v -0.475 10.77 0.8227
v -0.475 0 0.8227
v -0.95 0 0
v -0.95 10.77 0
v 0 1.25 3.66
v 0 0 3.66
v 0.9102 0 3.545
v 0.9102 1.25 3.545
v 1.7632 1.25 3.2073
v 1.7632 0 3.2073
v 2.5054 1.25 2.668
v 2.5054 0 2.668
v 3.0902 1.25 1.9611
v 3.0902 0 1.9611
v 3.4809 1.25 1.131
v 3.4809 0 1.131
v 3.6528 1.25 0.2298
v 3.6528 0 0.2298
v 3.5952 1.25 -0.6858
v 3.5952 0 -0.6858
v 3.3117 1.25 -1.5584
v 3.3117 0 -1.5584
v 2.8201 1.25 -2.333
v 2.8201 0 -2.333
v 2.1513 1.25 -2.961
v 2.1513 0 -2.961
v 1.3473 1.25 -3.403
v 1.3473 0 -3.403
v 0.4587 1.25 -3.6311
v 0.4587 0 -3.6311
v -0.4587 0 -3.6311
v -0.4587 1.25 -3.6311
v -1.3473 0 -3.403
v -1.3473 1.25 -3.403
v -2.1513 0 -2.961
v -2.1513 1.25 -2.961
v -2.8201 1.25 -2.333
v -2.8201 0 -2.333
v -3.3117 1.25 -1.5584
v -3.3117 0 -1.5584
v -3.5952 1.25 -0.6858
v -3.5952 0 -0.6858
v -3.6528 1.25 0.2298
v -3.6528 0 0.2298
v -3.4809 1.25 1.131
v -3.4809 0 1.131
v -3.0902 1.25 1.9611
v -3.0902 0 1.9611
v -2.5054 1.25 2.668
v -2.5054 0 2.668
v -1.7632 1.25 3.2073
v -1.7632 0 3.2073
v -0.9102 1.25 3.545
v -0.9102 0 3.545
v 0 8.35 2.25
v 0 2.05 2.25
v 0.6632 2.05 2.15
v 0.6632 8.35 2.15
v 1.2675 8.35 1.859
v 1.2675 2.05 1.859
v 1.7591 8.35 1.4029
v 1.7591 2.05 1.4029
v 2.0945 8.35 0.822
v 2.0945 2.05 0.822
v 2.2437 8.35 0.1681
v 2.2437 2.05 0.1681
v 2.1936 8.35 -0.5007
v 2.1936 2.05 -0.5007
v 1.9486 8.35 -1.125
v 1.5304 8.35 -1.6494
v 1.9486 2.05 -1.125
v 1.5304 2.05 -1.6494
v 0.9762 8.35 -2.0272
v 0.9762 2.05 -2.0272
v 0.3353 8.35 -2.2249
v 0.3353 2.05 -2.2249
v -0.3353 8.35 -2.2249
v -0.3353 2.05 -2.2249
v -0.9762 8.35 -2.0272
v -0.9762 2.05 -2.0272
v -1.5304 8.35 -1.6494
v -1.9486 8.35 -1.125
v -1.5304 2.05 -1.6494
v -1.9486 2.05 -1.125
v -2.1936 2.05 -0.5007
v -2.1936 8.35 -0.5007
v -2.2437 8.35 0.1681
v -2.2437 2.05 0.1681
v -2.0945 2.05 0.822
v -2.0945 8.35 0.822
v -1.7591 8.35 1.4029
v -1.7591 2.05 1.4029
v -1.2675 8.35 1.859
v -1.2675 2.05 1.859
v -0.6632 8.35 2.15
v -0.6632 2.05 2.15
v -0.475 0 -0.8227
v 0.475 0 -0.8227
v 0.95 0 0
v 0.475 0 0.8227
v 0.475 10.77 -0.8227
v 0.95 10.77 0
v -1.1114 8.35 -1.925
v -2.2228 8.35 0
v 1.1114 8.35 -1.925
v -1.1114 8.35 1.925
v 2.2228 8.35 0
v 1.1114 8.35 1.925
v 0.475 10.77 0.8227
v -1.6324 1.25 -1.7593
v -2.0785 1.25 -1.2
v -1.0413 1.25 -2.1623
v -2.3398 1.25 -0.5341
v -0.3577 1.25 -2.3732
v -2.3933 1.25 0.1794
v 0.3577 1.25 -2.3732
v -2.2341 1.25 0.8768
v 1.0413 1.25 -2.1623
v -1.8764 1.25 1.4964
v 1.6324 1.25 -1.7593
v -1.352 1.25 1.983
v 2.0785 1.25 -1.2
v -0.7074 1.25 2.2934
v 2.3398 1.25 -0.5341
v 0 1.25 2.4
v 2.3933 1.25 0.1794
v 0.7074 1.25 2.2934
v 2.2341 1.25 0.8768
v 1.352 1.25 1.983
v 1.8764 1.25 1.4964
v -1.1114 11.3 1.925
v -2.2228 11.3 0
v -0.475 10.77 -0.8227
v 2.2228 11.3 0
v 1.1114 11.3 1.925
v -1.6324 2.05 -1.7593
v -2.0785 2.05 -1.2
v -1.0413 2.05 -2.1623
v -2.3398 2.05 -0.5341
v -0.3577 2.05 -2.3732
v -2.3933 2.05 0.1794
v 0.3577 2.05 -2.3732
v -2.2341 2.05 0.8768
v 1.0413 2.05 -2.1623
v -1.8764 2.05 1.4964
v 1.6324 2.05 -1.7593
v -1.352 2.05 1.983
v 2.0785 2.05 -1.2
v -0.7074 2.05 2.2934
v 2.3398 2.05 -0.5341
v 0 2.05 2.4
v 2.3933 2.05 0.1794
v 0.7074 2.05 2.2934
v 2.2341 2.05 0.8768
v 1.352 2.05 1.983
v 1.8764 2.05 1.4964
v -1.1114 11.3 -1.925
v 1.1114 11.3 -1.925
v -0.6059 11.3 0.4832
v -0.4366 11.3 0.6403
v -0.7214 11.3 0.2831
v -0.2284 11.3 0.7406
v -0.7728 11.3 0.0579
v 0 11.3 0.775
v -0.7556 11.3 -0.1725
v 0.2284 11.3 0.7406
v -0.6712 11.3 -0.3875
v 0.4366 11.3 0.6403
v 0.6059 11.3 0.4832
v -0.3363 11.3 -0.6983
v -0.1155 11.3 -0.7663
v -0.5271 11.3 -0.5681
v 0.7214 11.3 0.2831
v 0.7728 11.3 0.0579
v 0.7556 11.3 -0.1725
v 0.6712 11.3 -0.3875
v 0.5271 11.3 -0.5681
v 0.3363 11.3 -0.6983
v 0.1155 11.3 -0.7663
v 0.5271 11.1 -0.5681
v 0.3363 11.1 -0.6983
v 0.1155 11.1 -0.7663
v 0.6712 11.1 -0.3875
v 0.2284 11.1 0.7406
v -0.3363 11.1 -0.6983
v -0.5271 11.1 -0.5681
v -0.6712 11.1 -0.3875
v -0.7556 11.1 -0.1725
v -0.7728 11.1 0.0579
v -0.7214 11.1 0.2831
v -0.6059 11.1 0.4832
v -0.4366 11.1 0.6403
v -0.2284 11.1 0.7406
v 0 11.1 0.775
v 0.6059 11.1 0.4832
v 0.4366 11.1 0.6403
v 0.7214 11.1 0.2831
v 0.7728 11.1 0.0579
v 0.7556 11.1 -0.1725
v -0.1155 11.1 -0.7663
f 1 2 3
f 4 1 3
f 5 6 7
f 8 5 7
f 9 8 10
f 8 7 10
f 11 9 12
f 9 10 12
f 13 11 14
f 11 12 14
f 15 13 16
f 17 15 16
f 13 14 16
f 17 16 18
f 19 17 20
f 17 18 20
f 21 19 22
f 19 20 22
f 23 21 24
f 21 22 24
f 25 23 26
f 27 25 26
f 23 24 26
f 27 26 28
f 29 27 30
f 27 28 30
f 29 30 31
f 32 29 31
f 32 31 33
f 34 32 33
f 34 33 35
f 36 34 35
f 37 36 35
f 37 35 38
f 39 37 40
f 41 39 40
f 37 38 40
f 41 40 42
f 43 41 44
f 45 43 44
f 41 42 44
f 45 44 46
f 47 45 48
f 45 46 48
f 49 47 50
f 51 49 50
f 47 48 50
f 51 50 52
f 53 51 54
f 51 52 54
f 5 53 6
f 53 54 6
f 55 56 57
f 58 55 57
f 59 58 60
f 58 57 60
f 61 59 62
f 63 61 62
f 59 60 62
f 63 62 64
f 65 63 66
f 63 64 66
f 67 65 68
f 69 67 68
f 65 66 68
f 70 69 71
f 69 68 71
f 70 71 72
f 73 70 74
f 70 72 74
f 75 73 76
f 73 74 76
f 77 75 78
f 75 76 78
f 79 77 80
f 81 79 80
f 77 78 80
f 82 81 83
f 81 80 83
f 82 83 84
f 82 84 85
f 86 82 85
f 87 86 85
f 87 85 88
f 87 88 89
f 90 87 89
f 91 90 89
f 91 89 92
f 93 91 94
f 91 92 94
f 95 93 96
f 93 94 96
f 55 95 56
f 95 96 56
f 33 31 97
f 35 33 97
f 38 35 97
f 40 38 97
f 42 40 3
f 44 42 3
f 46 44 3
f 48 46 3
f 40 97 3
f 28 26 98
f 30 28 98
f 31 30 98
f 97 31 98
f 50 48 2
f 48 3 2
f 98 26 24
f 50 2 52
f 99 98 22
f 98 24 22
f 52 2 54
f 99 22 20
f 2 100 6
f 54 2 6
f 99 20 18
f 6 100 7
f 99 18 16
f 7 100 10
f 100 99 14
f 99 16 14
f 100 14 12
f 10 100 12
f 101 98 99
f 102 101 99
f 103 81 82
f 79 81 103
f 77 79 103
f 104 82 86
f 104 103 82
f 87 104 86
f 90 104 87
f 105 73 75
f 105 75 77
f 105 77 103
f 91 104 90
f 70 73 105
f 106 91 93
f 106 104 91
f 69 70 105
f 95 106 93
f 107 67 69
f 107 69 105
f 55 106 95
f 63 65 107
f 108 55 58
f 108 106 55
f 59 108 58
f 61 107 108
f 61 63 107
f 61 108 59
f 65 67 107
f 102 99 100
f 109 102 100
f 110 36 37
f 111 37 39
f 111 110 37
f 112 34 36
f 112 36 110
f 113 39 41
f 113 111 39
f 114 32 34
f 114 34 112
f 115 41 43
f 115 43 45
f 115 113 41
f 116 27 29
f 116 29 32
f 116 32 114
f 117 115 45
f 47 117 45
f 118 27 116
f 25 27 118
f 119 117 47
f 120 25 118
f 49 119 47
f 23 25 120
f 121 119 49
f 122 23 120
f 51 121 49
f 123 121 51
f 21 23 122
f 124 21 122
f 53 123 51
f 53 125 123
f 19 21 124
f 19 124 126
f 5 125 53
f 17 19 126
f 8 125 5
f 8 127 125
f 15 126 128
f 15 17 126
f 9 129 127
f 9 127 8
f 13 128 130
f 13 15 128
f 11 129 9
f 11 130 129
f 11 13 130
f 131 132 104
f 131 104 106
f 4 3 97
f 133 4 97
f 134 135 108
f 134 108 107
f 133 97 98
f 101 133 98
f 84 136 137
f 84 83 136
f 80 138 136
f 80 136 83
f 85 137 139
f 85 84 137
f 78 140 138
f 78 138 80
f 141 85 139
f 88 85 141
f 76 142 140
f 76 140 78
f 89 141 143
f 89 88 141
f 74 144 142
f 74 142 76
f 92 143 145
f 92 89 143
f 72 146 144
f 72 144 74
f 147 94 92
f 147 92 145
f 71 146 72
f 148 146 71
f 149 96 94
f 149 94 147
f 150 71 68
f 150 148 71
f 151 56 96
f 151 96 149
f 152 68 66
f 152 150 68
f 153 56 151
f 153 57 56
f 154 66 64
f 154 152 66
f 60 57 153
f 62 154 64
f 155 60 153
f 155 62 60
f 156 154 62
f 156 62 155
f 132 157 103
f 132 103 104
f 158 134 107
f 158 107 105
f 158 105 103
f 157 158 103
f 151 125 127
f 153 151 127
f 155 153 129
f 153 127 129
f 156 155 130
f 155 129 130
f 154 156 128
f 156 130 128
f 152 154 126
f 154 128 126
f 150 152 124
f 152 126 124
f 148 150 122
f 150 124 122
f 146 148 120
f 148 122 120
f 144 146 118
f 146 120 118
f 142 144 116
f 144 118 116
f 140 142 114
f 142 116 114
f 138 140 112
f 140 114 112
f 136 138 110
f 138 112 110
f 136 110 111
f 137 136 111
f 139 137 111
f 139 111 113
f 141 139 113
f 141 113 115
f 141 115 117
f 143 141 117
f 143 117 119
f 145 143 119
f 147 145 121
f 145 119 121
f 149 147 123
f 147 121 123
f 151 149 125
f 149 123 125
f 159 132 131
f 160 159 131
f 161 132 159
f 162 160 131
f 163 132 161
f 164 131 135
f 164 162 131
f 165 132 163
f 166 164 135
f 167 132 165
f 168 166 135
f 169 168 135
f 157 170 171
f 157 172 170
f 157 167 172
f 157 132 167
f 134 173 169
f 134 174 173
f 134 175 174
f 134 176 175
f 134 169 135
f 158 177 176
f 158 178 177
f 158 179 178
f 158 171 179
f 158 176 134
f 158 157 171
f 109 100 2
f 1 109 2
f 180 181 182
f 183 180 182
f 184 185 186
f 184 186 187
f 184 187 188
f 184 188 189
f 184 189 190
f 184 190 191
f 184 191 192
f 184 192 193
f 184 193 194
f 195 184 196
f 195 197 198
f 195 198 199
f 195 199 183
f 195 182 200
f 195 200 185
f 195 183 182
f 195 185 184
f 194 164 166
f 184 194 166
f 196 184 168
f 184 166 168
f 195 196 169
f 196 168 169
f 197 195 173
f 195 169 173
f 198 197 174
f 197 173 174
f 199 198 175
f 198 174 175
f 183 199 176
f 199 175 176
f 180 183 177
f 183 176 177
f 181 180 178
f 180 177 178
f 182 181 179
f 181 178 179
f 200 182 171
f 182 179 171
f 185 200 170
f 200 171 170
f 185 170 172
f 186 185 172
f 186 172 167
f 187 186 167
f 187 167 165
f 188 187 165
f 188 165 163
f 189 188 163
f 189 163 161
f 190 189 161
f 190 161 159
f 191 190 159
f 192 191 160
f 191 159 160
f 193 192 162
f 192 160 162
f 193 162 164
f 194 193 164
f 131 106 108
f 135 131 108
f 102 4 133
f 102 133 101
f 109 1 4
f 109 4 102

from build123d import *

# Parameters (mm, degrees)
SKETCH1_R           = 3.66
BOSS_EXTRUDE1_DEPTH = 1.25
SKETCH2_R           = 2.4
BOSS_EXTRUDE2_DEPTH = 0.8
SKETCH3_R           = 2.25
BOSS_EXTRUDE3_DEPTH = 6.3
BOSS_EXTRUDE4_DEPTH = 2.95
SKETCH5_R           = 0.775
CUT_EXTRUDE4_DEPTH  = 0.2
CUT_EXTRUDE7_DEPTH  = 10.77


with BuildPart() as part:
    # Sketch1 → Boss-Extrude1 (new body)
    with BuildSketch(Plane(origin=(0, 0, 0), x_dir=(1, 0, 0), z_dir=(0, 1, 0))):
        with Locations(Location((0, 0, 0), (0, 0, 270))):
            Circle(SKETCH1_R)
    extrude(amount=BOSS_EXTRUDE1_DEPTH)

    # Sketch2 → Boss-Extrude2 (add)
    with BuildSketch(Plane(origin=(0, 1.25, 0), x_dir=(1, 0, 0), z_dir=(0, 1, 0))):
        with Locations(Location((0, 0, 0), (0, 0, 270))):
            Circle(SKETCH2_R)
    extrude(amount=BOSS_EXTRUDE2_DEPTH)

    # Sketch3 → Boss-Extrude3 (add)
    with BuildSketch(Plane(origin=(0, 2.05, 0), x_dir=(1, 0, 0), z_dir=(0, 1, 0))):
        with Locations(Location((0, 0, 0), (0, 0, 270))):
            Circle(SKETCH3_R)
    extrude(amount=BOSS_EXTRUDE3_DEPTH)

    # Sketch4 → Boss-Extrude4 (add)
    with BuildSketch(Plane(origin=(0, 8.35, 0), x_dir=(1, 0, 0), z_dir=(0, 1, 0))):
        Polygon((-2.222798536, 0), (-1.111399268, -1.925), (1.111399268, -1.925), (2.222798536, 0), (1.111399268, 1.925), (-1.111399268, 1.925), align=None)
    extrude(amount=BOSS_EXTRUDE4_DEPTH)

    # Sketch5 → Cut-Extrude4 (cut)
    with BuildSketch(Plane(origin=(0, 11.3, 0), x_dir=(1, 0, 0), z_dir=(0, 1, 0))):
        with Locations(Location((0, 0, 0), (0, 0, 270))):
            Circle(SKETCH5_R)
    extrude(amount=-CUT_EXTRUDE4_DEPTH, mode=Mode.SUBTRACT)

    # Sketch7 → Cut-Extrude7 (cut)
    with BuildSketch(Plane.XZ):
        Polygon((-0.95, 0), (-0.475, -0.822724134), (0.475, -0.822724134), (0.95, 0), (0.475, 0.822724134), (-0.475, 0.822724134), align=None)
    extrude(amount=-CUT_EXTRUDE7_DEPTH, mode=Mode.SUBTRACT)


solid = part.part
